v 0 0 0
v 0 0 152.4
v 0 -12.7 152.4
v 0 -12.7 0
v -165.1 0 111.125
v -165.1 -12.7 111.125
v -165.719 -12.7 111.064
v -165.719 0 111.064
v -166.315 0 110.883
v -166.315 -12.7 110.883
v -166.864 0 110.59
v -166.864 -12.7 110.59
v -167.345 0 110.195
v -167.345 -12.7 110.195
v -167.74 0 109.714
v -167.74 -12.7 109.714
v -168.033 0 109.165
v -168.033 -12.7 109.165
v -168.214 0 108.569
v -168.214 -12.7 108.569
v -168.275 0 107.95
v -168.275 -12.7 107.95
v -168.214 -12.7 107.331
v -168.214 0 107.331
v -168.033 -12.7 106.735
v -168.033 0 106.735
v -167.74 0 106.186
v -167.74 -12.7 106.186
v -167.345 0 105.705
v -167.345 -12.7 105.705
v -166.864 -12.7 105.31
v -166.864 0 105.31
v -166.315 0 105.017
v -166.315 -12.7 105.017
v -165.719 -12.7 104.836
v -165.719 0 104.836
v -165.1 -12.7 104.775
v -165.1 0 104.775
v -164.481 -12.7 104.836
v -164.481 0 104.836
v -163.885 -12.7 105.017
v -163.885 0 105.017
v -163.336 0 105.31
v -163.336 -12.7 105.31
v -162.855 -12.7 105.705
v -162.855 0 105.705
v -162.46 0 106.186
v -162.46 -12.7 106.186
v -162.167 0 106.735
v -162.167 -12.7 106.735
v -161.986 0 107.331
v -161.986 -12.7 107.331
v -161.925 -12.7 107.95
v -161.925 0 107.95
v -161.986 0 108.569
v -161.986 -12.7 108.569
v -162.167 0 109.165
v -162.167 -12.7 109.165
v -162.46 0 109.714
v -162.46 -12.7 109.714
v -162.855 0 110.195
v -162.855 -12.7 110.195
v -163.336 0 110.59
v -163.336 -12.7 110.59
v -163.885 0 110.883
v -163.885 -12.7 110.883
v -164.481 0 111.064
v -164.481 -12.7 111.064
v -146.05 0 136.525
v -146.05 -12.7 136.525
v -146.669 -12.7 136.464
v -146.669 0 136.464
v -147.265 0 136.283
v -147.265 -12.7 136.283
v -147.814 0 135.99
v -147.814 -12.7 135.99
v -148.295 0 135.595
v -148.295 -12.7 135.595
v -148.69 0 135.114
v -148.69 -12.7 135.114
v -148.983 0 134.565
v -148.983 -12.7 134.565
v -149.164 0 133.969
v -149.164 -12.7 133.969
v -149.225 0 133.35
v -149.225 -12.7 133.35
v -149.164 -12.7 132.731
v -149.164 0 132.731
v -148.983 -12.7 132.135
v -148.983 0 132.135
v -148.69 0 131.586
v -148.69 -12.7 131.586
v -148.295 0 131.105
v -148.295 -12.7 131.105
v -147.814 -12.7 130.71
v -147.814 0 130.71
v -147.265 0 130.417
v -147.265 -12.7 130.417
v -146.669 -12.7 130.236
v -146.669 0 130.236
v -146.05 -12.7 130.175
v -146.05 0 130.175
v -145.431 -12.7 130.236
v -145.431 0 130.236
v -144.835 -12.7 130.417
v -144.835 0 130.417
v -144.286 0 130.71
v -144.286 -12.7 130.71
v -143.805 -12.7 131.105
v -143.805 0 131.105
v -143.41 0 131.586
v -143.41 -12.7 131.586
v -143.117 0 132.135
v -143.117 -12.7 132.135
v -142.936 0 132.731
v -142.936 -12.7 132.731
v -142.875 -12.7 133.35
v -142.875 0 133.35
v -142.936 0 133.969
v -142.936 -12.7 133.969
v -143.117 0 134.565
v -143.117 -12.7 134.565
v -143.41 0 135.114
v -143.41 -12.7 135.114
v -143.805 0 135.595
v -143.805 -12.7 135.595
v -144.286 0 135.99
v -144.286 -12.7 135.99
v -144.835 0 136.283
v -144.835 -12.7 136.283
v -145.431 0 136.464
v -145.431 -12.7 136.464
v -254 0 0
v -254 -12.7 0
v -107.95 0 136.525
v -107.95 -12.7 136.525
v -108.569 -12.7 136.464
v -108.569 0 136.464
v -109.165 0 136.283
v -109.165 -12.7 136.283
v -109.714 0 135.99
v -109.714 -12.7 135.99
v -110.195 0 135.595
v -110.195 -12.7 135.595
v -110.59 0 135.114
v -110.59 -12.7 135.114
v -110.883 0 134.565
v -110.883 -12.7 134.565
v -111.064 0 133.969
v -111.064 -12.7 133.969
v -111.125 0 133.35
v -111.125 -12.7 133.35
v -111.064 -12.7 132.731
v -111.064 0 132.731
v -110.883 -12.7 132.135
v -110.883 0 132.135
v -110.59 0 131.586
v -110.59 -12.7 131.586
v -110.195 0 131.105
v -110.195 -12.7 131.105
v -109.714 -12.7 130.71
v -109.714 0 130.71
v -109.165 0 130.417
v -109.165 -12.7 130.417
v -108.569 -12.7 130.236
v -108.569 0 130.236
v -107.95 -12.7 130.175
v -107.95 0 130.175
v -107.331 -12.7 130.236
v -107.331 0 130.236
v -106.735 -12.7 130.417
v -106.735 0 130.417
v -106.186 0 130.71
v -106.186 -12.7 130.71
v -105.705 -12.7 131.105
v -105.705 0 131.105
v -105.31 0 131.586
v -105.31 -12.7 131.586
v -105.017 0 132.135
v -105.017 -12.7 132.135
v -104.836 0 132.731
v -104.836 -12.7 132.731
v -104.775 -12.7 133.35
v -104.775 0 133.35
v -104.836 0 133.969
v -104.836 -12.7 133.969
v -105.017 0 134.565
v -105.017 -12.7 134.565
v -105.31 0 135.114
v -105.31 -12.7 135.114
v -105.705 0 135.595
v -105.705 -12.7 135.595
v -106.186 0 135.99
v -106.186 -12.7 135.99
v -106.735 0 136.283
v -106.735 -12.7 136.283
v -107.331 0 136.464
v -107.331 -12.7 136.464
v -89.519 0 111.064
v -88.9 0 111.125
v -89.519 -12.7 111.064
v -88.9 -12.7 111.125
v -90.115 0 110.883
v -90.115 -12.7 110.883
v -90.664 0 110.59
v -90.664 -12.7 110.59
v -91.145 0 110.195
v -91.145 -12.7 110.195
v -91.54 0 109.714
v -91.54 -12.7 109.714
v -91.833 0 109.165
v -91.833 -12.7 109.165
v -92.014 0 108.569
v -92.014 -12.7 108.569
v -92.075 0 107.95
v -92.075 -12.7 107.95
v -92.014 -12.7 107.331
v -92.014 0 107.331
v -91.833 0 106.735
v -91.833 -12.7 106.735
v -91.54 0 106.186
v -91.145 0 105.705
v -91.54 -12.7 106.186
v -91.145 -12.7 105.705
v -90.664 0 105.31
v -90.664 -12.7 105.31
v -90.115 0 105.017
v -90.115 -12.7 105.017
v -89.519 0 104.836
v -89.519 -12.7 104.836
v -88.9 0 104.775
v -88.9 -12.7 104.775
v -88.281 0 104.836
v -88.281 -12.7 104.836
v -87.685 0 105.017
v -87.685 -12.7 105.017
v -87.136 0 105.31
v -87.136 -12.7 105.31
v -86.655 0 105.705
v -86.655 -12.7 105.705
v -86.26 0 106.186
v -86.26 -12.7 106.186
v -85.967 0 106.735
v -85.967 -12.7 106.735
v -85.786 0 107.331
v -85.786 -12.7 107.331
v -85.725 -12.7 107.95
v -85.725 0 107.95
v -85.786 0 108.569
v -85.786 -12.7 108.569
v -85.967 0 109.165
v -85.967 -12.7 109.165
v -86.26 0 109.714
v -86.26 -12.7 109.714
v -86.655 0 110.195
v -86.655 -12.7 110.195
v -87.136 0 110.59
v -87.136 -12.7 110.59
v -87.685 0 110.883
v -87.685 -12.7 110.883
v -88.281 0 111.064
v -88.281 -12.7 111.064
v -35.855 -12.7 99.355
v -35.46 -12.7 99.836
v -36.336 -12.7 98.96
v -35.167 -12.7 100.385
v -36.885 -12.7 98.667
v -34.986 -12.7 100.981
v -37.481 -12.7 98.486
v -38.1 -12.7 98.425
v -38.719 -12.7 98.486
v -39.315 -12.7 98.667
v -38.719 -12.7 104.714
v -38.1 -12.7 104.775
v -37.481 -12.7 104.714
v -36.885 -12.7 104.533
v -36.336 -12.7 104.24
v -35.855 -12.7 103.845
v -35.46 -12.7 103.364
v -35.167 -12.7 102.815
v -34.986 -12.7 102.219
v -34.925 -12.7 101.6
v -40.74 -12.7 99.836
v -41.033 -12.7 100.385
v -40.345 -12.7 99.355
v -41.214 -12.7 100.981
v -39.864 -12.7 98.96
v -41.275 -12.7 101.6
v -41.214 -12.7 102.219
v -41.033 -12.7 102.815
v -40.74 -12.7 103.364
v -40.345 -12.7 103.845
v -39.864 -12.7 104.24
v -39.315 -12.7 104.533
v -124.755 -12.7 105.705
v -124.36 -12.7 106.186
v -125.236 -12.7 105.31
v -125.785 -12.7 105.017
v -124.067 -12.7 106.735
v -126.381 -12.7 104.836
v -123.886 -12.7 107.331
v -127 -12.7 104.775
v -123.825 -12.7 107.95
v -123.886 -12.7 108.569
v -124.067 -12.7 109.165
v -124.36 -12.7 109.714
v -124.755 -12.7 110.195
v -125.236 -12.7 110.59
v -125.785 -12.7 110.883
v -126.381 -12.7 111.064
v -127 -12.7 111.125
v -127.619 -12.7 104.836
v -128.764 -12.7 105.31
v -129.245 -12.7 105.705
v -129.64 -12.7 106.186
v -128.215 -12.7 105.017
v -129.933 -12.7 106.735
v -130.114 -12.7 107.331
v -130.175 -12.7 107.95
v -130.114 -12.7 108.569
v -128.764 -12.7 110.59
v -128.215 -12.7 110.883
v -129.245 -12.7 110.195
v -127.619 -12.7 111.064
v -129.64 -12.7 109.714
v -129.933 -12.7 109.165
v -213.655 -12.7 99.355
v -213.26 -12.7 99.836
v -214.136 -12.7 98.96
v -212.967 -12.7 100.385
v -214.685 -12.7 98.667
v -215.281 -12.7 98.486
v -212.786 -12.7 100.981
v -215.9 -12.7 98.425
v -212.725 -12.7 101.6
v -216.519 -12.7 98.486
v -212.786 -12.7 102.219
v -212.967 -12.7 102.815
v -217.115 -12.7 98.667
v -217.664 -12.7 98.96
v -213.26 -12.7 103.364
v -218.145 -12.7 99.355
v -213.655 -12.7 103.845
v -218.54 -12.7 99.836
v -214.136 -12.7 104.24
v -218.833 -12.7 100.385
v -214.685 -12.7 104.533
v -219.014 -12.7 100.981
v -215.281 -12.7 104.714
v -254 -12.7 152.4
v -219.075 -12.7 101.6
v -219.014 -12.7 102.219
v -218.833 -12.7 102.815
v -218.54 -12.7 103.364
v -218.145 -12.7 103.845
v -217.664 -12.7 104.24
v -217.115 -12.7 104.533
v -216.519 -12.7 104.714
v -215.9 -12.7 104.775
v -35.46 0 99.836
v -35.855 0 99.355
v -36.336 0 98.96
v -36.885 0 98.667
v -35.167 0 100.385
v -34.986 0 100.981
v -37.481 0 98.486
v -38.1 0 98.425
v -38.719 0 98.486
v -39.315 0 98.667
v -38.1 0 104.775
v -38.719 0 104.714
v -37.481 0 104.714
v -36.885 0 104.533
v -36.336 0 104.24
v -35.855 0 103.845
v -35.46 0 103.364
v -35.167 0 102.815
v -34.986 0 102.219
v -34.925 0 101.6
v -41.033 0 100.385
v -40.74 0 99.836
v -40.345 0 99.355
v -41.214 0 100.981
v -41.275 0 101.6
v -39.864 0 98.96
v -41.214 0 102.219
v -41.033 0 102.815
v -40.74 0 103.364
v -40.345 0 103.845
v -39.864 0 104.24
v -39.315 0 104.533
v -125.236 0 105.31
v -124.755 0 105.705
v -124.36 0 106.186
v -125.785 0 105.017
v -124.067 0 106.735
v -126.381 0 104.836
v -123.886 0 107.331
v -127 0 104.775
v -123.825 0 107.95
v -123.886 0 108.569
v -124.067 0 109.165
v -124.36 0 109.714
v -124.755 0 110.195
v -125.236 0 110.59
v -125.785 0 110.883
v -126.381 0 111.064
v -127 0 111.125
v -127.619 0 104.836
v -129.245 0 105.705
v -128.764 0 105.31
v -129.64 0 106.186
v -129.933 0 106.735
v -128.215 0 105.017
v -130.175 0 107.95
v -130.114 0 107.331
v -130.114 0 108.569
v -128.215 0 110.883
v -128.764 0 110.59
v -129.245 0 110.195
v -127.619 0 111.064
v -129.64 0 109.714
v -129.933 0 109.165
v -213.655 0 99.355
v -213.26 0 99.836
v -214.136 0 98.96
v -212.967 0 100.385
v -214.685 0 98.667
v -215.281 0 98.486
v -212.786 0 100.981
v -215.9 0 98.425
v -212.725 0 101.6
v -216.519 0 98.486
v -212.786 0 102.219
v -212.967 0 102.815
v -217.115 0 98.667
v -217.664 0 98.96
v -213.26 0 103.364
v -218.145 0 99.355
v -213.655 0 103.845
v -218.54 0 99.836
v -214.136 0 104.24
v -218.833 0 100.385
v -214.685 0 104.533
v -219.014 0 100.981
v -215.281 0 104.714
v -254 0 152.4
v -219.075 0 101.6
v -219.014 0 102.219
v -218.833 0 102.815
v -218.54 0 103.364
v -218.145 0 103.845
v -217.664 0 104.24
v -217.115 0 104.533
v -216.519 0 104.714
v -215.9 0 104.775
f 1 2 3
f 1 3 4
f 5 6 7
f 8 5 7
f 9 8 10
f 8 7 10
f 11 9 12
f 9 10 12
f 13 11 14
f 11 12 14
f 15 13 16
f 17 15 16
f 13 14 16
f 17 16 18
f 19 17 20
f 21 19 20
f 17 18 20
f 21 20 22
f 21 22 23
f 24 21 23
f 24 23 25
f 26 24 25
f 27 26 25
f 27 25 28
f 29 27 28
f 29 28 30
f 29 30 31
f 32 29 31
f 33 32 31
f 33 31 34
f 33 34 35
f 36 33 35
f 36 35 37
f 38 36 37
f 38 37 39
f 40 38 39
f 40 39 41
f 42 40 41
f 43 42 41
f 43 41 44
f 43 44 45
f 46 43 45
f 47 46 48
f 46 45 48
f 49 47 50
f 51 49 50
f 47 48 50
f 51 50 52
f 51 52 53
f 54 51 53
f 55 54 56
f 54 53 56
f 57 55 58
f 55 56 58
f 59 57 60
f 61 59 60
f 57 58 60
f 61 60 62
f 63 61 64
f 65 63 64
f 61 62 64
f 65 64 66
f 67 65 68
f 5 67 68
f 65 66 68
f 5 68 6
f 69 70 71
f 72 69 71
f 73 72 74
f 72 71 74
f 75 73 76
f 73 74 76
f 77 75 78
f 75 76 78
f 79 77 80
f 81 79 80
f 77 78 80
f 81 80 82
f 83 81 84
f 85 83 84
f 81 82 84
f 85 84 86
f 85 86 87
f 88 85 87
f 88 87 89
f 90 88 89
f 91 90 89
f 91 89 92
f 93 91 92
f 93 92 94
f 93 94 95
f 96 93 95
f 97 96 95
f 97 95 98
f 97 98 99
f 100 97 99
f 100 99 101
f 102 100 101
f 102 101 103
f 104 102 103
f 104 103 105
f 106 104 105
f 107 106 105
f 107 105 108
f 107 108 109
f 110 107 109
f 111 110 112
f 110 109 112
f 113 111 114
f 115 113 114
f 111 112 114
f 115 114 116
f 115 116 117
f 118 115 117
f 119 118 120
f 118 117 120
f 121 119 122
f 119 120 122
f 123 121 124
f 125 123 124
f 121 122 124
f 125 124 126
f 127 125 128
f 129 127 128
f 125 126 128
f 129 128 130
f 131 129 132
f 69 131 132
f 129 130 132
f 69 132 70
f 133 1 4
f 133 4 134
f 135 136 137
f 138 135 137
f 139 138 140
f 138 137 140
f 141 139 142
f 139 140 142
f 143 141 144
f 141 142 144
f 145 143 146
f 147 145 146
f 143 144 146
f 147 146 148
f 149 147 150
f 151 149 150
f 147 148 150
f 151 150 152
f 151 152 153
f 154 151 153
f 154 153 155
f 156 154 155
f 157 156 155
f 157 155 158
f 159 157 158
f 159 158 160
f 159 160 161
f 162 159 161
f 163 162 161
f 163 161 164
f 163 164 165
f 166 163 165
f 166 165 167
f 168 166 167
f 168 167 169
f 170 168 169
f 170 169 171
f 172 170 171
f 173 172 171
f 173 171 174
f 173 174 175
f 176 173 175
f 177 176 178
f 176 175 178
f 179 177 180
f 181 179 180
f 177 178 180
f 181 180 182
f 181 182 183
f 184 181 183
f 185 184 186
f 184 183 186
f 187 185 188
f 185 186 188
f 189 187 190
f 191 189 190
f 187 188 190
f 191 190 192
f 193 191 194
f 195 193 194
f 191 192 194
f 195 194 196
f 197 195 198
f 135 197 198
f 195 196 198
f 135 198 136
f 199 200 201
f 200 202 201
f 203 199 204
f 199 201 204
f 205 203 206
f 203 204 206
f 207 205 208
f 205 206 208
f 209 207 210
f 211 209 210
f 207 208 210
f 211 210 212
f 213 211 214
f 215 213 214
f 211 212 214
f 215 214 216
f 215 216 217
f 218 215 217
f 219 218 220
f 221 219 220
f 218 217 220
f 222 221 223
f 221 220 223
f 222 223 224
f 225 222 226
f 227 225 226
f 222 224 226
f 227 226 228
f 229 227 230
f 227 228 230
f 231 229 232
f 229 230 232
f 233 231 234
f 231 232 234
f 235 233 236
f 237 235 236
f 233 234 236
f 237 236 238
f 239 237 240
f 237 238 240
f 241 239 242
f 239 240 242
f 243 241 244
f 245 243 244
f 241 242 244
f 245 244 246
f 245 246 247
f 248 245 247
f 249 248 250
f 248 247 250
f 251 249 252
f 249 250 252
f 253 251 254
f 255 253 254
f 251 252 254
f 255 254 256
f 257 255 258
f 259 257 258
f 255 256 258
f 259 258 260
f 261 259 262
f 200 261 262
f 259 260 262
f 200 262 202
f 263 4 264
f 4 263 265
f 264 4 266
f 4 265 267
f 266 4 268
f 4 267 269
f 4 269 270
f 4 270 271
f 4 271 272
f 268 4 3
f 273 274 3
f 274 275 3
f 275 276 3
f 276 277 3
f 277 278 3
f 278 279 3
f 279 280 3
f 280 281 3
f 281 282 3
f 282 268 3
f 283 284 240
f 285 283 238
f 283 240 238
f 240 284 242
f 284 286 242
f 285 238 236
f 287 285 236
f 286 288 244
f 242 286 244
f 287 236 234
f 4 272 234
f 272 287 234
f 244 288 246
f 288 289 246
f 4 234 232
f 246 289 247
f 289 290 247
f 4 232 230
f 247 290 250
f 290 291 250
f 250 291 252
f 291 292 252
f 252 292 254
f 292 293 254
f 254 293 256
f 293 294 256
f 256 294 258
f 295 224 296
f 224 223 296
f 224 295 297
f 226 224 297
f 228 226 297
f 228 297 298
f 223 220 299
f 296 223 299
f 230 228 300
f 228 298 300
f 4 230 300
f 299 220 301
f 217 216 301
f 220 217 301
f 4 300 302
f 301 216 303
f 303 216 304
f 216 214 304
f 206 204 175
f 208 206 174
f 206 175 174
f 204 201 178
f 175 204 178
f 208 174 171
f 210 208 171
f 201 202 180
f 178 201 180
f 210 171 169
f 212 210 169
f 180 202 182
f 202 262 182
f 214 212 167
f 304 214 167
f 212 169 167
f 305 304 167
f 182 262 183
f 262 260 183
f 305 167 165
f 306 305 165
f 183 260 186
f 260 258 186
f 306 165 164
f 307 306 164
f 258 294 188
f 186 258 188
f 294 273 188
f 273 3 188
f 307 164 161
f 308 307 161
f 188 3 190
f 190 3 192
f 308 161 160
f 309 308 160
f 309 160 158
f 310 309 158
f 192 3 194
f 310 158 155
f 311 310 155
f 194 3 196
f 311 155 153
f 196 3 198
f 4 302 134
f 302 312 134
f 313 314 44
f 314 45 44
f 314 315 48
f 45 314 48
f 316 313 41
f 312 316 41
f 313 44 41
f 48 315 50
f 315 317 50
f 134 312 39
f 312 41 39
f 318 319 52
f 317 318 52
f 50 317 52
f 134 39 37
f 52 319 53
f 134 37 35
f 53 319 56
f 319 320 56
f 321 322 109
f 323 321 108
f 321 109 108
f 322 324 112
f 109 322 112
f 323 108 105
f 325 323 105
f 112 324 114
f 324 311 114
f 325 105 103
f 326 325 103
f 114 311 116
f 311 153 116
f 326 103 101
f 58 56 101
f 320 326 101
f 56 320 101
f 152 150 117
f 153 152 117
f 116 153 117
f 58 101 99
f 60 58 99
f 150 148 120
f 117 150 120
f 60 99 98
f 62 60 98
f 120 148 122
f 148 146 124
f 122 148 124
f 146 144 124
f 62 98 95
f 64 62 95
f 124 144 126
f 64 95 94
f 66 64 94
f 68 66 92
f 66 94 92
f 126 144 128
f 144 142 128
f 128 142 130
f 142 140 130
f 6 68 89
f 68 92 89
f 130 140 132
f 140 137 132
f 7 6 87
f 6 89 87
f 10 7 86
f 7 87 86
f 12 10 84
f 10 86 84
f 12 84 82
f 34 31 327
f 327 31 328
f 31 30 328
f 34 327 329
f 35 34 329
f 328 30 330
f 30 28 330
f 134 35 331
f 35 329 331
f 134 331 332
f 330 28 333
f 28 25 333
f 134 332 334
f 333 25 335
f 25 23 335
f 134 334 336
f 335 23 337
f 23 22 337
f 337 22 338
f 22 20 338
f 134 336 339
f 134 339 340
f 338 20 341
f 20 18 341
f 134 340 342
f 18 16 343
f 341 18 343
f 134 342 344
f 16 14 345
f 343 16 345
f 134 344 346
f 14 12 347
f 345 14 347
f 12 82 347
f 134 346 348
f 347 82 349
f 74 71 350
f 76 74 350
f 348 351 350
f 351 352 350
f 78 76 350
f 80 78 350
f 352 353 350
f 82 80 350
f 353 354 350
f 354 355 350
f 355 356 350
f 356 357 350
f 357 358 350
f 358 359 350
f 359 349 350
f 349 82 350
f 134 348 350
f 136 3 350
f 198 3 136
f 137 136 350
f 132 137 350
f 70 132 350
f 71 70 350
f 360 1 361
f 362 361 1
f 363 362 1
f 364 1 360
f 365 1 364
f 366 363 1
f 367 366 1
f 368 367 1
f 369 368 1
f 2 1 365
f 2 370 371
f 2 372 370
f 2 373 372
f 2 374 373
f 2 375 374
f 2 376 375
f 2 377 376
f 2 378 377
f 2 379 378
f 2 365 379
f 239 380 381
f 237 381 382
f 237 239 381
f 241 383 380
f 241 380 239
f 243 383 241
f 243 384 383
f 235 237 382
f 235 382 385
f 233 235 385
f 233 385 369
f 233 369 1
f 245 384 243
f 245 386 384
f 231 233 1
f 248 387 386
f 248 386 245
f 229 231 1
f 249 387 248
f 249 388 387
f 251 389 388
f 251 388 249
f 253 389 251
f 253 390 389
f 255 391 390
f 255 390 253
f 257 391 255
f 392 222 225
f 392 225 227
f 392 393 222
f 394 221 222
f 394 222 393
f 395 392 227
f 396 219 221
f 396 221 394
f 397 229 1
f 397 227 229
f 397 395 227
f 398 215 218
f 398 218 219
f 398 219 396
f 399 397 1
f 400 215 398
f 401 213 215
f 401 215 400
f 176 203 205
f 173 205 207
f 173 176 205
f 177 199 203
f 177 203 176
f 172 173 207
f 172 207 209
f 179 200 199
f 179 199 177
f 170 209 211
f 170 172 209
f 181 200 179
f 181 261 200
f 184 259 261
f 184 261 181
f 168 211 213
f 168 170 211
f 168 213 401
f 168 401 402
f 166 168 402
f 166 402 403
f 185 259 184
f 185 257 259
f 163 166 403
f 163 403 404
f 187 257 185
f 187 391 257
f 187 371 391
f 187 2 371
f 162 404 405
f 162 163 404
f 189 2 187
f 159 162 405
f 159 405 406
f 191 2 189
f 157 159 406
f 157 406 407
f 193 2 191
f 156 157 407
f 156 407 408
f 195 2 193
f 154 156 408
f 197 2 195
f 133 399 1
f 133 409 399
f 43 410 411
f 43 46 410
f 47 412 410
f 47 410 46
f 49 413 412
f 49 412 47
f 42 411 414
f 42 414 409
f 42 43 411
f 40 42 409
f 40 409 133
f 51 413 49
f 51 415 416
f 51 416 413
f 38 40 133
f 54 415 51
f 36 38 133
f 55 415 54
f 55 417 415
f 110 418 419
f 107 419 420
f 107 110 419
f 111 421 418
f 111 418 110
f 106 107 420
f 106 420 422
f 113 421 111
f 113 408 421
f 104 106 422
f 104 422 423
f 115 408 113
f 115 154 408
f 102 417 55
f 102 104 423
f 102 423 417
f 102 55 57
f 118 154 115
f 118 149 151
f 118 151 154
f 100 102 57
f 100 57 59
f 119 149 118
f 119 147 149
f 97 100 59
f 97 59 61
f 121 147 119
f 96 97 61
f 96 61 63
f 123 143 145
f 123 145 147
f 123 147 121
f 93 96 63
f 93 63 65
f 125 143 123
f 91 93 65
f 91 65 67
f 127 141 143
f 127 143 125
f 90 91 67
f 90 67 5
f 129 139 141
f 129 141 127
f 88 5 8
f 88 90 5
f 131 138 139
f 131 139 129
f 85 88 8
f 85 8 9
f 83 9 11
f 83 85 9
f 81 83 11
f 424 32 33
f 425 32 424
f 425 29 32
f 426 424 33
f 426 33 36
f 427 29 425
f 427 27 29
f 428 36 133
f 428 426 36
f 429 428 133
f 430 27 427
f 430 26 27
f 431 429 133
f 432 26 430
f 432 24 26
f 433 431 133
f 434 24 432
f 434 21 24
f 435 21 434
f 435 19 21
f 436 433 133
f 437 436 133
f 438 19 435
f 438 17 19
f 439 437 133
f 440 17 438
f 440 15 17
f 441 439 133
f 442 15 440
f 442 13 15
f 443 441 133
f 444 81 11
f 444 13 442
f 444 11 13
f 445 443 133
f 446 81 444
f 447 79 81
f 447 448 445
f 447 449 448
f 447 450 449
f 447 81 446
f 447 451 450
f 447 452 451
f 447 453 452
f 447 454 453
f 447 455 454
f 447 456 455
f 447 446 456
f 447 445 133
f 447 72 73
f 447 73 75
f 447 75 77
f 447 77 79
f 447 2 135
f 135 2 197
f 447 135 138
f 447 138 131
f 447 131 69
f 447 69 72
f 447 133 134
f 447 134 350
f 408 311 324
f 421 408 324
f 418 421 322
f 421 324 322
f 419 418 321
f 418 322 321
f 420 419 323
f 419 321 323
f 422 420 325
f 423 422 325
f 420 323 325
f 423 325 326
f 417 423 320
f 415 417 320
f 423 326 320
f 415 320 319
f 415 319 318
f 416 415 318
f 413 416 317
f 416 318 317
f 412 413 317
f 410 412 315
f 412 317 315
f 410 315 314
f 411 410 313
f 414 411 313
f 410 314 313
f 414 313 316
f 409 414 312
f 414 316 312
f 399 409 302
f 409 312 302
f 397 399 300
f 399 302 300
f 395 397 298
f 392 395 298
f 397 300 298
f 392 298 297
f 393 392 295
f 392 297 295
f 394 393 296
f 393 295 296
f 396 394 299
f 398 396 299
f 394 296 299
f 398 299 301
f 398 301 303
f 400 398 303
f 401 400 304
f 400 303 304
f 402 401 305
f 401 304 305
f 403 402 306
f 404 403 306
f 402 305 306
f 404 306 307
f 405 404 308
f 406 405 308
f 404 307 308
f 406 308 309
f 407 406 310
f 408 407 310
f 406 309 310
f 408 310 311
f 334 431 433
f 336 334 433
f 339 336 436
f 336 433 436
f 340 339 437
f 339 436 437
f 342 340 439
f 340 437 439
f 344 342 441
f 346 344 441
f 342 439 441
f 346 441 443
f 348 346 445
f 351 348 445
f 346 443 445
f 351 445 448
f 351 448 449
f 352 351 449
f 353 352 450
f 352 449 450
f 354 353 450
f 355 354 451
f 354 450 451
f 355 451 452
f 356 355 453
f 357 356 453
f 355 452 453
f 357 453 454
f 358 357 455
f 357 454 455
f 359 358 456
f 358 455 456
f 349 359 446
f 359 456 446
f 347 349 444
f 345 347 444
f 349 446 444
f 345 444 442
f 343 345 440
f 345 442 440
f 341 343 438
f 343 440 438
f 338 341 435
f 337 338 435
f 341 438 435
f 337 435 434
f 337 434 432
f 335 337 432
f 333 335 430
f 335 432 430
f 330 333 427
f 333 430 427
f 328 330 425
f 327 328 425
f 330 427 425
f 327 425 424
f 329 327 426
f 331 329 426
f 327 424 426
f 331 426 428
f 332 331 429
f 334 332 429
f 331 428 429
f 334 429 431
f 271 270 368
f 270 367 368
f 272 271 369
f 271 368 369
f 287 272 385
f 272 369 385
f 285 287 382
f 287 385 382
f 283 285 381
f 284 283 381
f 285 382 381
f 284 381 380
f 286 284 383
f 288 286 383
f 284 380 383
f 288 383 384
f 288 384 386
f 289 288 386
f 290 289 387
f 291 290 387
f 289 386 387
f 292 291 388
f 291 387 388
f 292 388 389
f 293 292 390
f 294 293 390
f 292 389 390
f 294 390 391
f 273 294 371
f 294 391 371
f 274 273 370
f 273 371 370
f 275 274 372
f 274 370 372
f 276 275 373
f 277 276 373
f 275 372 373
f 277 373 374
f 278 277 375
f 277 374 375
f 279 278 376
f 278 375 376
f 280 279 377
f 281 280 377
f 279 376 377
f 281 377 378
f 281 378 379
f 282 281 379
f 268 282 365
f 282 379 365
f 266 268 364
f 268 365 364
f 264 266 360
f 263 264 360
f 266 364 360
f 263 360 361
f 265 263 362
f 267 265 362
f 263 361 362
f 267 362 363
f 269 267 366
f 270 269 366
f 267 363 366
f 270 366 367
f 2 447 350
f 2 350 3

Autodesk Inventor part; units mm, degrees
ref_plane "YZ Plane" through (0, 0, 0) normal (1, 0, 0) x (0, 1, 0)
ref_plane "XZ Plane" through (0, 0, 0) normal (0, 1, 0) x (-1, 0, 0)
ref_plane "XY Plane" through (0, 0, 0) normal (0, 0, 1) x (1, 0, 0)
sketch "Sketch1" plane through (0, 0, 0) normal (0, 1, 0) x (-1, 0, 0)
  line L0 (0, 0) -> (254, 0)
  line L1 (254, 0) -> (254, 152.4)
  line L2 (254, 152.4) -> (0, 152.4)
  line L3 (0, 152.4) -> (0, 0)
  dimension "d0" = 254
  dimension "d1" = 152.4
extrude "Extrusion1" add sketch "Sketch1" against normal blind 12.7
sketch "Sketch5" plane through (0, -12.7, 0) normal (0, -1, 0) x (1, 0, 0)
  line L0 (0, 0) -> (0, 152.4) projected
  line L1 (0, 152.4) -> (-254, 152.4) projected
  line L2 (-254, 152.4) -> (-254, 0) projected
  point P0 (-38.1, 101.6)
  point P1 (-215.9, 101.6)
  dimension "d20" = 50.8
  dimension "d21" = 38.1
  dimension "d22" = 38.1
hole "Hole1" at (-38.1, -12.7, 101.6) at (-215.9, -12.7, 101.6) direction (0, 1, 0) diameter 6.35 end through all
sketch "Sketch10" plane through (0, 0, 0) normal (0, 1, 0) x (1, 0, 0)
  line L0 (-254, 0) -> (-254, -152.4) projected
  line L1 (-254, -152.4) -> (0, -152.4) projected
  line L2 (0, -152.4) -> (0, 0) projected
  point P0 (-88.9, -107.95)
  point P1 (-127, -107.95)
  point P2 (-165.1, -107.95)
  point P3 (-146.05, -133.35)
  point P4 (-107.95, -133.35)
  dimension "d67" = 38.1
  dimension "d69" = 38.1
  dimension "d70" = 19.05
  dimension "d71" = 19.05
  dimension "d72" = 127
  dimension "d73" = 127
  dimension "d74" = 19.05
  dimension "d75" = 25.4
hole "Hole5" at (-88.9, 0, 107.95) at (-127, 0, 107.95) at (-165.1, 0, 107.95) at (-146.05, 0, 133.35) at (-107.95, 0, 133.35) direction (0, -1, 0) diameter 6.35 end through all
equation "\"d22\" = d21"
equation "\"d72\" = d73"
properties part number "tractor"
